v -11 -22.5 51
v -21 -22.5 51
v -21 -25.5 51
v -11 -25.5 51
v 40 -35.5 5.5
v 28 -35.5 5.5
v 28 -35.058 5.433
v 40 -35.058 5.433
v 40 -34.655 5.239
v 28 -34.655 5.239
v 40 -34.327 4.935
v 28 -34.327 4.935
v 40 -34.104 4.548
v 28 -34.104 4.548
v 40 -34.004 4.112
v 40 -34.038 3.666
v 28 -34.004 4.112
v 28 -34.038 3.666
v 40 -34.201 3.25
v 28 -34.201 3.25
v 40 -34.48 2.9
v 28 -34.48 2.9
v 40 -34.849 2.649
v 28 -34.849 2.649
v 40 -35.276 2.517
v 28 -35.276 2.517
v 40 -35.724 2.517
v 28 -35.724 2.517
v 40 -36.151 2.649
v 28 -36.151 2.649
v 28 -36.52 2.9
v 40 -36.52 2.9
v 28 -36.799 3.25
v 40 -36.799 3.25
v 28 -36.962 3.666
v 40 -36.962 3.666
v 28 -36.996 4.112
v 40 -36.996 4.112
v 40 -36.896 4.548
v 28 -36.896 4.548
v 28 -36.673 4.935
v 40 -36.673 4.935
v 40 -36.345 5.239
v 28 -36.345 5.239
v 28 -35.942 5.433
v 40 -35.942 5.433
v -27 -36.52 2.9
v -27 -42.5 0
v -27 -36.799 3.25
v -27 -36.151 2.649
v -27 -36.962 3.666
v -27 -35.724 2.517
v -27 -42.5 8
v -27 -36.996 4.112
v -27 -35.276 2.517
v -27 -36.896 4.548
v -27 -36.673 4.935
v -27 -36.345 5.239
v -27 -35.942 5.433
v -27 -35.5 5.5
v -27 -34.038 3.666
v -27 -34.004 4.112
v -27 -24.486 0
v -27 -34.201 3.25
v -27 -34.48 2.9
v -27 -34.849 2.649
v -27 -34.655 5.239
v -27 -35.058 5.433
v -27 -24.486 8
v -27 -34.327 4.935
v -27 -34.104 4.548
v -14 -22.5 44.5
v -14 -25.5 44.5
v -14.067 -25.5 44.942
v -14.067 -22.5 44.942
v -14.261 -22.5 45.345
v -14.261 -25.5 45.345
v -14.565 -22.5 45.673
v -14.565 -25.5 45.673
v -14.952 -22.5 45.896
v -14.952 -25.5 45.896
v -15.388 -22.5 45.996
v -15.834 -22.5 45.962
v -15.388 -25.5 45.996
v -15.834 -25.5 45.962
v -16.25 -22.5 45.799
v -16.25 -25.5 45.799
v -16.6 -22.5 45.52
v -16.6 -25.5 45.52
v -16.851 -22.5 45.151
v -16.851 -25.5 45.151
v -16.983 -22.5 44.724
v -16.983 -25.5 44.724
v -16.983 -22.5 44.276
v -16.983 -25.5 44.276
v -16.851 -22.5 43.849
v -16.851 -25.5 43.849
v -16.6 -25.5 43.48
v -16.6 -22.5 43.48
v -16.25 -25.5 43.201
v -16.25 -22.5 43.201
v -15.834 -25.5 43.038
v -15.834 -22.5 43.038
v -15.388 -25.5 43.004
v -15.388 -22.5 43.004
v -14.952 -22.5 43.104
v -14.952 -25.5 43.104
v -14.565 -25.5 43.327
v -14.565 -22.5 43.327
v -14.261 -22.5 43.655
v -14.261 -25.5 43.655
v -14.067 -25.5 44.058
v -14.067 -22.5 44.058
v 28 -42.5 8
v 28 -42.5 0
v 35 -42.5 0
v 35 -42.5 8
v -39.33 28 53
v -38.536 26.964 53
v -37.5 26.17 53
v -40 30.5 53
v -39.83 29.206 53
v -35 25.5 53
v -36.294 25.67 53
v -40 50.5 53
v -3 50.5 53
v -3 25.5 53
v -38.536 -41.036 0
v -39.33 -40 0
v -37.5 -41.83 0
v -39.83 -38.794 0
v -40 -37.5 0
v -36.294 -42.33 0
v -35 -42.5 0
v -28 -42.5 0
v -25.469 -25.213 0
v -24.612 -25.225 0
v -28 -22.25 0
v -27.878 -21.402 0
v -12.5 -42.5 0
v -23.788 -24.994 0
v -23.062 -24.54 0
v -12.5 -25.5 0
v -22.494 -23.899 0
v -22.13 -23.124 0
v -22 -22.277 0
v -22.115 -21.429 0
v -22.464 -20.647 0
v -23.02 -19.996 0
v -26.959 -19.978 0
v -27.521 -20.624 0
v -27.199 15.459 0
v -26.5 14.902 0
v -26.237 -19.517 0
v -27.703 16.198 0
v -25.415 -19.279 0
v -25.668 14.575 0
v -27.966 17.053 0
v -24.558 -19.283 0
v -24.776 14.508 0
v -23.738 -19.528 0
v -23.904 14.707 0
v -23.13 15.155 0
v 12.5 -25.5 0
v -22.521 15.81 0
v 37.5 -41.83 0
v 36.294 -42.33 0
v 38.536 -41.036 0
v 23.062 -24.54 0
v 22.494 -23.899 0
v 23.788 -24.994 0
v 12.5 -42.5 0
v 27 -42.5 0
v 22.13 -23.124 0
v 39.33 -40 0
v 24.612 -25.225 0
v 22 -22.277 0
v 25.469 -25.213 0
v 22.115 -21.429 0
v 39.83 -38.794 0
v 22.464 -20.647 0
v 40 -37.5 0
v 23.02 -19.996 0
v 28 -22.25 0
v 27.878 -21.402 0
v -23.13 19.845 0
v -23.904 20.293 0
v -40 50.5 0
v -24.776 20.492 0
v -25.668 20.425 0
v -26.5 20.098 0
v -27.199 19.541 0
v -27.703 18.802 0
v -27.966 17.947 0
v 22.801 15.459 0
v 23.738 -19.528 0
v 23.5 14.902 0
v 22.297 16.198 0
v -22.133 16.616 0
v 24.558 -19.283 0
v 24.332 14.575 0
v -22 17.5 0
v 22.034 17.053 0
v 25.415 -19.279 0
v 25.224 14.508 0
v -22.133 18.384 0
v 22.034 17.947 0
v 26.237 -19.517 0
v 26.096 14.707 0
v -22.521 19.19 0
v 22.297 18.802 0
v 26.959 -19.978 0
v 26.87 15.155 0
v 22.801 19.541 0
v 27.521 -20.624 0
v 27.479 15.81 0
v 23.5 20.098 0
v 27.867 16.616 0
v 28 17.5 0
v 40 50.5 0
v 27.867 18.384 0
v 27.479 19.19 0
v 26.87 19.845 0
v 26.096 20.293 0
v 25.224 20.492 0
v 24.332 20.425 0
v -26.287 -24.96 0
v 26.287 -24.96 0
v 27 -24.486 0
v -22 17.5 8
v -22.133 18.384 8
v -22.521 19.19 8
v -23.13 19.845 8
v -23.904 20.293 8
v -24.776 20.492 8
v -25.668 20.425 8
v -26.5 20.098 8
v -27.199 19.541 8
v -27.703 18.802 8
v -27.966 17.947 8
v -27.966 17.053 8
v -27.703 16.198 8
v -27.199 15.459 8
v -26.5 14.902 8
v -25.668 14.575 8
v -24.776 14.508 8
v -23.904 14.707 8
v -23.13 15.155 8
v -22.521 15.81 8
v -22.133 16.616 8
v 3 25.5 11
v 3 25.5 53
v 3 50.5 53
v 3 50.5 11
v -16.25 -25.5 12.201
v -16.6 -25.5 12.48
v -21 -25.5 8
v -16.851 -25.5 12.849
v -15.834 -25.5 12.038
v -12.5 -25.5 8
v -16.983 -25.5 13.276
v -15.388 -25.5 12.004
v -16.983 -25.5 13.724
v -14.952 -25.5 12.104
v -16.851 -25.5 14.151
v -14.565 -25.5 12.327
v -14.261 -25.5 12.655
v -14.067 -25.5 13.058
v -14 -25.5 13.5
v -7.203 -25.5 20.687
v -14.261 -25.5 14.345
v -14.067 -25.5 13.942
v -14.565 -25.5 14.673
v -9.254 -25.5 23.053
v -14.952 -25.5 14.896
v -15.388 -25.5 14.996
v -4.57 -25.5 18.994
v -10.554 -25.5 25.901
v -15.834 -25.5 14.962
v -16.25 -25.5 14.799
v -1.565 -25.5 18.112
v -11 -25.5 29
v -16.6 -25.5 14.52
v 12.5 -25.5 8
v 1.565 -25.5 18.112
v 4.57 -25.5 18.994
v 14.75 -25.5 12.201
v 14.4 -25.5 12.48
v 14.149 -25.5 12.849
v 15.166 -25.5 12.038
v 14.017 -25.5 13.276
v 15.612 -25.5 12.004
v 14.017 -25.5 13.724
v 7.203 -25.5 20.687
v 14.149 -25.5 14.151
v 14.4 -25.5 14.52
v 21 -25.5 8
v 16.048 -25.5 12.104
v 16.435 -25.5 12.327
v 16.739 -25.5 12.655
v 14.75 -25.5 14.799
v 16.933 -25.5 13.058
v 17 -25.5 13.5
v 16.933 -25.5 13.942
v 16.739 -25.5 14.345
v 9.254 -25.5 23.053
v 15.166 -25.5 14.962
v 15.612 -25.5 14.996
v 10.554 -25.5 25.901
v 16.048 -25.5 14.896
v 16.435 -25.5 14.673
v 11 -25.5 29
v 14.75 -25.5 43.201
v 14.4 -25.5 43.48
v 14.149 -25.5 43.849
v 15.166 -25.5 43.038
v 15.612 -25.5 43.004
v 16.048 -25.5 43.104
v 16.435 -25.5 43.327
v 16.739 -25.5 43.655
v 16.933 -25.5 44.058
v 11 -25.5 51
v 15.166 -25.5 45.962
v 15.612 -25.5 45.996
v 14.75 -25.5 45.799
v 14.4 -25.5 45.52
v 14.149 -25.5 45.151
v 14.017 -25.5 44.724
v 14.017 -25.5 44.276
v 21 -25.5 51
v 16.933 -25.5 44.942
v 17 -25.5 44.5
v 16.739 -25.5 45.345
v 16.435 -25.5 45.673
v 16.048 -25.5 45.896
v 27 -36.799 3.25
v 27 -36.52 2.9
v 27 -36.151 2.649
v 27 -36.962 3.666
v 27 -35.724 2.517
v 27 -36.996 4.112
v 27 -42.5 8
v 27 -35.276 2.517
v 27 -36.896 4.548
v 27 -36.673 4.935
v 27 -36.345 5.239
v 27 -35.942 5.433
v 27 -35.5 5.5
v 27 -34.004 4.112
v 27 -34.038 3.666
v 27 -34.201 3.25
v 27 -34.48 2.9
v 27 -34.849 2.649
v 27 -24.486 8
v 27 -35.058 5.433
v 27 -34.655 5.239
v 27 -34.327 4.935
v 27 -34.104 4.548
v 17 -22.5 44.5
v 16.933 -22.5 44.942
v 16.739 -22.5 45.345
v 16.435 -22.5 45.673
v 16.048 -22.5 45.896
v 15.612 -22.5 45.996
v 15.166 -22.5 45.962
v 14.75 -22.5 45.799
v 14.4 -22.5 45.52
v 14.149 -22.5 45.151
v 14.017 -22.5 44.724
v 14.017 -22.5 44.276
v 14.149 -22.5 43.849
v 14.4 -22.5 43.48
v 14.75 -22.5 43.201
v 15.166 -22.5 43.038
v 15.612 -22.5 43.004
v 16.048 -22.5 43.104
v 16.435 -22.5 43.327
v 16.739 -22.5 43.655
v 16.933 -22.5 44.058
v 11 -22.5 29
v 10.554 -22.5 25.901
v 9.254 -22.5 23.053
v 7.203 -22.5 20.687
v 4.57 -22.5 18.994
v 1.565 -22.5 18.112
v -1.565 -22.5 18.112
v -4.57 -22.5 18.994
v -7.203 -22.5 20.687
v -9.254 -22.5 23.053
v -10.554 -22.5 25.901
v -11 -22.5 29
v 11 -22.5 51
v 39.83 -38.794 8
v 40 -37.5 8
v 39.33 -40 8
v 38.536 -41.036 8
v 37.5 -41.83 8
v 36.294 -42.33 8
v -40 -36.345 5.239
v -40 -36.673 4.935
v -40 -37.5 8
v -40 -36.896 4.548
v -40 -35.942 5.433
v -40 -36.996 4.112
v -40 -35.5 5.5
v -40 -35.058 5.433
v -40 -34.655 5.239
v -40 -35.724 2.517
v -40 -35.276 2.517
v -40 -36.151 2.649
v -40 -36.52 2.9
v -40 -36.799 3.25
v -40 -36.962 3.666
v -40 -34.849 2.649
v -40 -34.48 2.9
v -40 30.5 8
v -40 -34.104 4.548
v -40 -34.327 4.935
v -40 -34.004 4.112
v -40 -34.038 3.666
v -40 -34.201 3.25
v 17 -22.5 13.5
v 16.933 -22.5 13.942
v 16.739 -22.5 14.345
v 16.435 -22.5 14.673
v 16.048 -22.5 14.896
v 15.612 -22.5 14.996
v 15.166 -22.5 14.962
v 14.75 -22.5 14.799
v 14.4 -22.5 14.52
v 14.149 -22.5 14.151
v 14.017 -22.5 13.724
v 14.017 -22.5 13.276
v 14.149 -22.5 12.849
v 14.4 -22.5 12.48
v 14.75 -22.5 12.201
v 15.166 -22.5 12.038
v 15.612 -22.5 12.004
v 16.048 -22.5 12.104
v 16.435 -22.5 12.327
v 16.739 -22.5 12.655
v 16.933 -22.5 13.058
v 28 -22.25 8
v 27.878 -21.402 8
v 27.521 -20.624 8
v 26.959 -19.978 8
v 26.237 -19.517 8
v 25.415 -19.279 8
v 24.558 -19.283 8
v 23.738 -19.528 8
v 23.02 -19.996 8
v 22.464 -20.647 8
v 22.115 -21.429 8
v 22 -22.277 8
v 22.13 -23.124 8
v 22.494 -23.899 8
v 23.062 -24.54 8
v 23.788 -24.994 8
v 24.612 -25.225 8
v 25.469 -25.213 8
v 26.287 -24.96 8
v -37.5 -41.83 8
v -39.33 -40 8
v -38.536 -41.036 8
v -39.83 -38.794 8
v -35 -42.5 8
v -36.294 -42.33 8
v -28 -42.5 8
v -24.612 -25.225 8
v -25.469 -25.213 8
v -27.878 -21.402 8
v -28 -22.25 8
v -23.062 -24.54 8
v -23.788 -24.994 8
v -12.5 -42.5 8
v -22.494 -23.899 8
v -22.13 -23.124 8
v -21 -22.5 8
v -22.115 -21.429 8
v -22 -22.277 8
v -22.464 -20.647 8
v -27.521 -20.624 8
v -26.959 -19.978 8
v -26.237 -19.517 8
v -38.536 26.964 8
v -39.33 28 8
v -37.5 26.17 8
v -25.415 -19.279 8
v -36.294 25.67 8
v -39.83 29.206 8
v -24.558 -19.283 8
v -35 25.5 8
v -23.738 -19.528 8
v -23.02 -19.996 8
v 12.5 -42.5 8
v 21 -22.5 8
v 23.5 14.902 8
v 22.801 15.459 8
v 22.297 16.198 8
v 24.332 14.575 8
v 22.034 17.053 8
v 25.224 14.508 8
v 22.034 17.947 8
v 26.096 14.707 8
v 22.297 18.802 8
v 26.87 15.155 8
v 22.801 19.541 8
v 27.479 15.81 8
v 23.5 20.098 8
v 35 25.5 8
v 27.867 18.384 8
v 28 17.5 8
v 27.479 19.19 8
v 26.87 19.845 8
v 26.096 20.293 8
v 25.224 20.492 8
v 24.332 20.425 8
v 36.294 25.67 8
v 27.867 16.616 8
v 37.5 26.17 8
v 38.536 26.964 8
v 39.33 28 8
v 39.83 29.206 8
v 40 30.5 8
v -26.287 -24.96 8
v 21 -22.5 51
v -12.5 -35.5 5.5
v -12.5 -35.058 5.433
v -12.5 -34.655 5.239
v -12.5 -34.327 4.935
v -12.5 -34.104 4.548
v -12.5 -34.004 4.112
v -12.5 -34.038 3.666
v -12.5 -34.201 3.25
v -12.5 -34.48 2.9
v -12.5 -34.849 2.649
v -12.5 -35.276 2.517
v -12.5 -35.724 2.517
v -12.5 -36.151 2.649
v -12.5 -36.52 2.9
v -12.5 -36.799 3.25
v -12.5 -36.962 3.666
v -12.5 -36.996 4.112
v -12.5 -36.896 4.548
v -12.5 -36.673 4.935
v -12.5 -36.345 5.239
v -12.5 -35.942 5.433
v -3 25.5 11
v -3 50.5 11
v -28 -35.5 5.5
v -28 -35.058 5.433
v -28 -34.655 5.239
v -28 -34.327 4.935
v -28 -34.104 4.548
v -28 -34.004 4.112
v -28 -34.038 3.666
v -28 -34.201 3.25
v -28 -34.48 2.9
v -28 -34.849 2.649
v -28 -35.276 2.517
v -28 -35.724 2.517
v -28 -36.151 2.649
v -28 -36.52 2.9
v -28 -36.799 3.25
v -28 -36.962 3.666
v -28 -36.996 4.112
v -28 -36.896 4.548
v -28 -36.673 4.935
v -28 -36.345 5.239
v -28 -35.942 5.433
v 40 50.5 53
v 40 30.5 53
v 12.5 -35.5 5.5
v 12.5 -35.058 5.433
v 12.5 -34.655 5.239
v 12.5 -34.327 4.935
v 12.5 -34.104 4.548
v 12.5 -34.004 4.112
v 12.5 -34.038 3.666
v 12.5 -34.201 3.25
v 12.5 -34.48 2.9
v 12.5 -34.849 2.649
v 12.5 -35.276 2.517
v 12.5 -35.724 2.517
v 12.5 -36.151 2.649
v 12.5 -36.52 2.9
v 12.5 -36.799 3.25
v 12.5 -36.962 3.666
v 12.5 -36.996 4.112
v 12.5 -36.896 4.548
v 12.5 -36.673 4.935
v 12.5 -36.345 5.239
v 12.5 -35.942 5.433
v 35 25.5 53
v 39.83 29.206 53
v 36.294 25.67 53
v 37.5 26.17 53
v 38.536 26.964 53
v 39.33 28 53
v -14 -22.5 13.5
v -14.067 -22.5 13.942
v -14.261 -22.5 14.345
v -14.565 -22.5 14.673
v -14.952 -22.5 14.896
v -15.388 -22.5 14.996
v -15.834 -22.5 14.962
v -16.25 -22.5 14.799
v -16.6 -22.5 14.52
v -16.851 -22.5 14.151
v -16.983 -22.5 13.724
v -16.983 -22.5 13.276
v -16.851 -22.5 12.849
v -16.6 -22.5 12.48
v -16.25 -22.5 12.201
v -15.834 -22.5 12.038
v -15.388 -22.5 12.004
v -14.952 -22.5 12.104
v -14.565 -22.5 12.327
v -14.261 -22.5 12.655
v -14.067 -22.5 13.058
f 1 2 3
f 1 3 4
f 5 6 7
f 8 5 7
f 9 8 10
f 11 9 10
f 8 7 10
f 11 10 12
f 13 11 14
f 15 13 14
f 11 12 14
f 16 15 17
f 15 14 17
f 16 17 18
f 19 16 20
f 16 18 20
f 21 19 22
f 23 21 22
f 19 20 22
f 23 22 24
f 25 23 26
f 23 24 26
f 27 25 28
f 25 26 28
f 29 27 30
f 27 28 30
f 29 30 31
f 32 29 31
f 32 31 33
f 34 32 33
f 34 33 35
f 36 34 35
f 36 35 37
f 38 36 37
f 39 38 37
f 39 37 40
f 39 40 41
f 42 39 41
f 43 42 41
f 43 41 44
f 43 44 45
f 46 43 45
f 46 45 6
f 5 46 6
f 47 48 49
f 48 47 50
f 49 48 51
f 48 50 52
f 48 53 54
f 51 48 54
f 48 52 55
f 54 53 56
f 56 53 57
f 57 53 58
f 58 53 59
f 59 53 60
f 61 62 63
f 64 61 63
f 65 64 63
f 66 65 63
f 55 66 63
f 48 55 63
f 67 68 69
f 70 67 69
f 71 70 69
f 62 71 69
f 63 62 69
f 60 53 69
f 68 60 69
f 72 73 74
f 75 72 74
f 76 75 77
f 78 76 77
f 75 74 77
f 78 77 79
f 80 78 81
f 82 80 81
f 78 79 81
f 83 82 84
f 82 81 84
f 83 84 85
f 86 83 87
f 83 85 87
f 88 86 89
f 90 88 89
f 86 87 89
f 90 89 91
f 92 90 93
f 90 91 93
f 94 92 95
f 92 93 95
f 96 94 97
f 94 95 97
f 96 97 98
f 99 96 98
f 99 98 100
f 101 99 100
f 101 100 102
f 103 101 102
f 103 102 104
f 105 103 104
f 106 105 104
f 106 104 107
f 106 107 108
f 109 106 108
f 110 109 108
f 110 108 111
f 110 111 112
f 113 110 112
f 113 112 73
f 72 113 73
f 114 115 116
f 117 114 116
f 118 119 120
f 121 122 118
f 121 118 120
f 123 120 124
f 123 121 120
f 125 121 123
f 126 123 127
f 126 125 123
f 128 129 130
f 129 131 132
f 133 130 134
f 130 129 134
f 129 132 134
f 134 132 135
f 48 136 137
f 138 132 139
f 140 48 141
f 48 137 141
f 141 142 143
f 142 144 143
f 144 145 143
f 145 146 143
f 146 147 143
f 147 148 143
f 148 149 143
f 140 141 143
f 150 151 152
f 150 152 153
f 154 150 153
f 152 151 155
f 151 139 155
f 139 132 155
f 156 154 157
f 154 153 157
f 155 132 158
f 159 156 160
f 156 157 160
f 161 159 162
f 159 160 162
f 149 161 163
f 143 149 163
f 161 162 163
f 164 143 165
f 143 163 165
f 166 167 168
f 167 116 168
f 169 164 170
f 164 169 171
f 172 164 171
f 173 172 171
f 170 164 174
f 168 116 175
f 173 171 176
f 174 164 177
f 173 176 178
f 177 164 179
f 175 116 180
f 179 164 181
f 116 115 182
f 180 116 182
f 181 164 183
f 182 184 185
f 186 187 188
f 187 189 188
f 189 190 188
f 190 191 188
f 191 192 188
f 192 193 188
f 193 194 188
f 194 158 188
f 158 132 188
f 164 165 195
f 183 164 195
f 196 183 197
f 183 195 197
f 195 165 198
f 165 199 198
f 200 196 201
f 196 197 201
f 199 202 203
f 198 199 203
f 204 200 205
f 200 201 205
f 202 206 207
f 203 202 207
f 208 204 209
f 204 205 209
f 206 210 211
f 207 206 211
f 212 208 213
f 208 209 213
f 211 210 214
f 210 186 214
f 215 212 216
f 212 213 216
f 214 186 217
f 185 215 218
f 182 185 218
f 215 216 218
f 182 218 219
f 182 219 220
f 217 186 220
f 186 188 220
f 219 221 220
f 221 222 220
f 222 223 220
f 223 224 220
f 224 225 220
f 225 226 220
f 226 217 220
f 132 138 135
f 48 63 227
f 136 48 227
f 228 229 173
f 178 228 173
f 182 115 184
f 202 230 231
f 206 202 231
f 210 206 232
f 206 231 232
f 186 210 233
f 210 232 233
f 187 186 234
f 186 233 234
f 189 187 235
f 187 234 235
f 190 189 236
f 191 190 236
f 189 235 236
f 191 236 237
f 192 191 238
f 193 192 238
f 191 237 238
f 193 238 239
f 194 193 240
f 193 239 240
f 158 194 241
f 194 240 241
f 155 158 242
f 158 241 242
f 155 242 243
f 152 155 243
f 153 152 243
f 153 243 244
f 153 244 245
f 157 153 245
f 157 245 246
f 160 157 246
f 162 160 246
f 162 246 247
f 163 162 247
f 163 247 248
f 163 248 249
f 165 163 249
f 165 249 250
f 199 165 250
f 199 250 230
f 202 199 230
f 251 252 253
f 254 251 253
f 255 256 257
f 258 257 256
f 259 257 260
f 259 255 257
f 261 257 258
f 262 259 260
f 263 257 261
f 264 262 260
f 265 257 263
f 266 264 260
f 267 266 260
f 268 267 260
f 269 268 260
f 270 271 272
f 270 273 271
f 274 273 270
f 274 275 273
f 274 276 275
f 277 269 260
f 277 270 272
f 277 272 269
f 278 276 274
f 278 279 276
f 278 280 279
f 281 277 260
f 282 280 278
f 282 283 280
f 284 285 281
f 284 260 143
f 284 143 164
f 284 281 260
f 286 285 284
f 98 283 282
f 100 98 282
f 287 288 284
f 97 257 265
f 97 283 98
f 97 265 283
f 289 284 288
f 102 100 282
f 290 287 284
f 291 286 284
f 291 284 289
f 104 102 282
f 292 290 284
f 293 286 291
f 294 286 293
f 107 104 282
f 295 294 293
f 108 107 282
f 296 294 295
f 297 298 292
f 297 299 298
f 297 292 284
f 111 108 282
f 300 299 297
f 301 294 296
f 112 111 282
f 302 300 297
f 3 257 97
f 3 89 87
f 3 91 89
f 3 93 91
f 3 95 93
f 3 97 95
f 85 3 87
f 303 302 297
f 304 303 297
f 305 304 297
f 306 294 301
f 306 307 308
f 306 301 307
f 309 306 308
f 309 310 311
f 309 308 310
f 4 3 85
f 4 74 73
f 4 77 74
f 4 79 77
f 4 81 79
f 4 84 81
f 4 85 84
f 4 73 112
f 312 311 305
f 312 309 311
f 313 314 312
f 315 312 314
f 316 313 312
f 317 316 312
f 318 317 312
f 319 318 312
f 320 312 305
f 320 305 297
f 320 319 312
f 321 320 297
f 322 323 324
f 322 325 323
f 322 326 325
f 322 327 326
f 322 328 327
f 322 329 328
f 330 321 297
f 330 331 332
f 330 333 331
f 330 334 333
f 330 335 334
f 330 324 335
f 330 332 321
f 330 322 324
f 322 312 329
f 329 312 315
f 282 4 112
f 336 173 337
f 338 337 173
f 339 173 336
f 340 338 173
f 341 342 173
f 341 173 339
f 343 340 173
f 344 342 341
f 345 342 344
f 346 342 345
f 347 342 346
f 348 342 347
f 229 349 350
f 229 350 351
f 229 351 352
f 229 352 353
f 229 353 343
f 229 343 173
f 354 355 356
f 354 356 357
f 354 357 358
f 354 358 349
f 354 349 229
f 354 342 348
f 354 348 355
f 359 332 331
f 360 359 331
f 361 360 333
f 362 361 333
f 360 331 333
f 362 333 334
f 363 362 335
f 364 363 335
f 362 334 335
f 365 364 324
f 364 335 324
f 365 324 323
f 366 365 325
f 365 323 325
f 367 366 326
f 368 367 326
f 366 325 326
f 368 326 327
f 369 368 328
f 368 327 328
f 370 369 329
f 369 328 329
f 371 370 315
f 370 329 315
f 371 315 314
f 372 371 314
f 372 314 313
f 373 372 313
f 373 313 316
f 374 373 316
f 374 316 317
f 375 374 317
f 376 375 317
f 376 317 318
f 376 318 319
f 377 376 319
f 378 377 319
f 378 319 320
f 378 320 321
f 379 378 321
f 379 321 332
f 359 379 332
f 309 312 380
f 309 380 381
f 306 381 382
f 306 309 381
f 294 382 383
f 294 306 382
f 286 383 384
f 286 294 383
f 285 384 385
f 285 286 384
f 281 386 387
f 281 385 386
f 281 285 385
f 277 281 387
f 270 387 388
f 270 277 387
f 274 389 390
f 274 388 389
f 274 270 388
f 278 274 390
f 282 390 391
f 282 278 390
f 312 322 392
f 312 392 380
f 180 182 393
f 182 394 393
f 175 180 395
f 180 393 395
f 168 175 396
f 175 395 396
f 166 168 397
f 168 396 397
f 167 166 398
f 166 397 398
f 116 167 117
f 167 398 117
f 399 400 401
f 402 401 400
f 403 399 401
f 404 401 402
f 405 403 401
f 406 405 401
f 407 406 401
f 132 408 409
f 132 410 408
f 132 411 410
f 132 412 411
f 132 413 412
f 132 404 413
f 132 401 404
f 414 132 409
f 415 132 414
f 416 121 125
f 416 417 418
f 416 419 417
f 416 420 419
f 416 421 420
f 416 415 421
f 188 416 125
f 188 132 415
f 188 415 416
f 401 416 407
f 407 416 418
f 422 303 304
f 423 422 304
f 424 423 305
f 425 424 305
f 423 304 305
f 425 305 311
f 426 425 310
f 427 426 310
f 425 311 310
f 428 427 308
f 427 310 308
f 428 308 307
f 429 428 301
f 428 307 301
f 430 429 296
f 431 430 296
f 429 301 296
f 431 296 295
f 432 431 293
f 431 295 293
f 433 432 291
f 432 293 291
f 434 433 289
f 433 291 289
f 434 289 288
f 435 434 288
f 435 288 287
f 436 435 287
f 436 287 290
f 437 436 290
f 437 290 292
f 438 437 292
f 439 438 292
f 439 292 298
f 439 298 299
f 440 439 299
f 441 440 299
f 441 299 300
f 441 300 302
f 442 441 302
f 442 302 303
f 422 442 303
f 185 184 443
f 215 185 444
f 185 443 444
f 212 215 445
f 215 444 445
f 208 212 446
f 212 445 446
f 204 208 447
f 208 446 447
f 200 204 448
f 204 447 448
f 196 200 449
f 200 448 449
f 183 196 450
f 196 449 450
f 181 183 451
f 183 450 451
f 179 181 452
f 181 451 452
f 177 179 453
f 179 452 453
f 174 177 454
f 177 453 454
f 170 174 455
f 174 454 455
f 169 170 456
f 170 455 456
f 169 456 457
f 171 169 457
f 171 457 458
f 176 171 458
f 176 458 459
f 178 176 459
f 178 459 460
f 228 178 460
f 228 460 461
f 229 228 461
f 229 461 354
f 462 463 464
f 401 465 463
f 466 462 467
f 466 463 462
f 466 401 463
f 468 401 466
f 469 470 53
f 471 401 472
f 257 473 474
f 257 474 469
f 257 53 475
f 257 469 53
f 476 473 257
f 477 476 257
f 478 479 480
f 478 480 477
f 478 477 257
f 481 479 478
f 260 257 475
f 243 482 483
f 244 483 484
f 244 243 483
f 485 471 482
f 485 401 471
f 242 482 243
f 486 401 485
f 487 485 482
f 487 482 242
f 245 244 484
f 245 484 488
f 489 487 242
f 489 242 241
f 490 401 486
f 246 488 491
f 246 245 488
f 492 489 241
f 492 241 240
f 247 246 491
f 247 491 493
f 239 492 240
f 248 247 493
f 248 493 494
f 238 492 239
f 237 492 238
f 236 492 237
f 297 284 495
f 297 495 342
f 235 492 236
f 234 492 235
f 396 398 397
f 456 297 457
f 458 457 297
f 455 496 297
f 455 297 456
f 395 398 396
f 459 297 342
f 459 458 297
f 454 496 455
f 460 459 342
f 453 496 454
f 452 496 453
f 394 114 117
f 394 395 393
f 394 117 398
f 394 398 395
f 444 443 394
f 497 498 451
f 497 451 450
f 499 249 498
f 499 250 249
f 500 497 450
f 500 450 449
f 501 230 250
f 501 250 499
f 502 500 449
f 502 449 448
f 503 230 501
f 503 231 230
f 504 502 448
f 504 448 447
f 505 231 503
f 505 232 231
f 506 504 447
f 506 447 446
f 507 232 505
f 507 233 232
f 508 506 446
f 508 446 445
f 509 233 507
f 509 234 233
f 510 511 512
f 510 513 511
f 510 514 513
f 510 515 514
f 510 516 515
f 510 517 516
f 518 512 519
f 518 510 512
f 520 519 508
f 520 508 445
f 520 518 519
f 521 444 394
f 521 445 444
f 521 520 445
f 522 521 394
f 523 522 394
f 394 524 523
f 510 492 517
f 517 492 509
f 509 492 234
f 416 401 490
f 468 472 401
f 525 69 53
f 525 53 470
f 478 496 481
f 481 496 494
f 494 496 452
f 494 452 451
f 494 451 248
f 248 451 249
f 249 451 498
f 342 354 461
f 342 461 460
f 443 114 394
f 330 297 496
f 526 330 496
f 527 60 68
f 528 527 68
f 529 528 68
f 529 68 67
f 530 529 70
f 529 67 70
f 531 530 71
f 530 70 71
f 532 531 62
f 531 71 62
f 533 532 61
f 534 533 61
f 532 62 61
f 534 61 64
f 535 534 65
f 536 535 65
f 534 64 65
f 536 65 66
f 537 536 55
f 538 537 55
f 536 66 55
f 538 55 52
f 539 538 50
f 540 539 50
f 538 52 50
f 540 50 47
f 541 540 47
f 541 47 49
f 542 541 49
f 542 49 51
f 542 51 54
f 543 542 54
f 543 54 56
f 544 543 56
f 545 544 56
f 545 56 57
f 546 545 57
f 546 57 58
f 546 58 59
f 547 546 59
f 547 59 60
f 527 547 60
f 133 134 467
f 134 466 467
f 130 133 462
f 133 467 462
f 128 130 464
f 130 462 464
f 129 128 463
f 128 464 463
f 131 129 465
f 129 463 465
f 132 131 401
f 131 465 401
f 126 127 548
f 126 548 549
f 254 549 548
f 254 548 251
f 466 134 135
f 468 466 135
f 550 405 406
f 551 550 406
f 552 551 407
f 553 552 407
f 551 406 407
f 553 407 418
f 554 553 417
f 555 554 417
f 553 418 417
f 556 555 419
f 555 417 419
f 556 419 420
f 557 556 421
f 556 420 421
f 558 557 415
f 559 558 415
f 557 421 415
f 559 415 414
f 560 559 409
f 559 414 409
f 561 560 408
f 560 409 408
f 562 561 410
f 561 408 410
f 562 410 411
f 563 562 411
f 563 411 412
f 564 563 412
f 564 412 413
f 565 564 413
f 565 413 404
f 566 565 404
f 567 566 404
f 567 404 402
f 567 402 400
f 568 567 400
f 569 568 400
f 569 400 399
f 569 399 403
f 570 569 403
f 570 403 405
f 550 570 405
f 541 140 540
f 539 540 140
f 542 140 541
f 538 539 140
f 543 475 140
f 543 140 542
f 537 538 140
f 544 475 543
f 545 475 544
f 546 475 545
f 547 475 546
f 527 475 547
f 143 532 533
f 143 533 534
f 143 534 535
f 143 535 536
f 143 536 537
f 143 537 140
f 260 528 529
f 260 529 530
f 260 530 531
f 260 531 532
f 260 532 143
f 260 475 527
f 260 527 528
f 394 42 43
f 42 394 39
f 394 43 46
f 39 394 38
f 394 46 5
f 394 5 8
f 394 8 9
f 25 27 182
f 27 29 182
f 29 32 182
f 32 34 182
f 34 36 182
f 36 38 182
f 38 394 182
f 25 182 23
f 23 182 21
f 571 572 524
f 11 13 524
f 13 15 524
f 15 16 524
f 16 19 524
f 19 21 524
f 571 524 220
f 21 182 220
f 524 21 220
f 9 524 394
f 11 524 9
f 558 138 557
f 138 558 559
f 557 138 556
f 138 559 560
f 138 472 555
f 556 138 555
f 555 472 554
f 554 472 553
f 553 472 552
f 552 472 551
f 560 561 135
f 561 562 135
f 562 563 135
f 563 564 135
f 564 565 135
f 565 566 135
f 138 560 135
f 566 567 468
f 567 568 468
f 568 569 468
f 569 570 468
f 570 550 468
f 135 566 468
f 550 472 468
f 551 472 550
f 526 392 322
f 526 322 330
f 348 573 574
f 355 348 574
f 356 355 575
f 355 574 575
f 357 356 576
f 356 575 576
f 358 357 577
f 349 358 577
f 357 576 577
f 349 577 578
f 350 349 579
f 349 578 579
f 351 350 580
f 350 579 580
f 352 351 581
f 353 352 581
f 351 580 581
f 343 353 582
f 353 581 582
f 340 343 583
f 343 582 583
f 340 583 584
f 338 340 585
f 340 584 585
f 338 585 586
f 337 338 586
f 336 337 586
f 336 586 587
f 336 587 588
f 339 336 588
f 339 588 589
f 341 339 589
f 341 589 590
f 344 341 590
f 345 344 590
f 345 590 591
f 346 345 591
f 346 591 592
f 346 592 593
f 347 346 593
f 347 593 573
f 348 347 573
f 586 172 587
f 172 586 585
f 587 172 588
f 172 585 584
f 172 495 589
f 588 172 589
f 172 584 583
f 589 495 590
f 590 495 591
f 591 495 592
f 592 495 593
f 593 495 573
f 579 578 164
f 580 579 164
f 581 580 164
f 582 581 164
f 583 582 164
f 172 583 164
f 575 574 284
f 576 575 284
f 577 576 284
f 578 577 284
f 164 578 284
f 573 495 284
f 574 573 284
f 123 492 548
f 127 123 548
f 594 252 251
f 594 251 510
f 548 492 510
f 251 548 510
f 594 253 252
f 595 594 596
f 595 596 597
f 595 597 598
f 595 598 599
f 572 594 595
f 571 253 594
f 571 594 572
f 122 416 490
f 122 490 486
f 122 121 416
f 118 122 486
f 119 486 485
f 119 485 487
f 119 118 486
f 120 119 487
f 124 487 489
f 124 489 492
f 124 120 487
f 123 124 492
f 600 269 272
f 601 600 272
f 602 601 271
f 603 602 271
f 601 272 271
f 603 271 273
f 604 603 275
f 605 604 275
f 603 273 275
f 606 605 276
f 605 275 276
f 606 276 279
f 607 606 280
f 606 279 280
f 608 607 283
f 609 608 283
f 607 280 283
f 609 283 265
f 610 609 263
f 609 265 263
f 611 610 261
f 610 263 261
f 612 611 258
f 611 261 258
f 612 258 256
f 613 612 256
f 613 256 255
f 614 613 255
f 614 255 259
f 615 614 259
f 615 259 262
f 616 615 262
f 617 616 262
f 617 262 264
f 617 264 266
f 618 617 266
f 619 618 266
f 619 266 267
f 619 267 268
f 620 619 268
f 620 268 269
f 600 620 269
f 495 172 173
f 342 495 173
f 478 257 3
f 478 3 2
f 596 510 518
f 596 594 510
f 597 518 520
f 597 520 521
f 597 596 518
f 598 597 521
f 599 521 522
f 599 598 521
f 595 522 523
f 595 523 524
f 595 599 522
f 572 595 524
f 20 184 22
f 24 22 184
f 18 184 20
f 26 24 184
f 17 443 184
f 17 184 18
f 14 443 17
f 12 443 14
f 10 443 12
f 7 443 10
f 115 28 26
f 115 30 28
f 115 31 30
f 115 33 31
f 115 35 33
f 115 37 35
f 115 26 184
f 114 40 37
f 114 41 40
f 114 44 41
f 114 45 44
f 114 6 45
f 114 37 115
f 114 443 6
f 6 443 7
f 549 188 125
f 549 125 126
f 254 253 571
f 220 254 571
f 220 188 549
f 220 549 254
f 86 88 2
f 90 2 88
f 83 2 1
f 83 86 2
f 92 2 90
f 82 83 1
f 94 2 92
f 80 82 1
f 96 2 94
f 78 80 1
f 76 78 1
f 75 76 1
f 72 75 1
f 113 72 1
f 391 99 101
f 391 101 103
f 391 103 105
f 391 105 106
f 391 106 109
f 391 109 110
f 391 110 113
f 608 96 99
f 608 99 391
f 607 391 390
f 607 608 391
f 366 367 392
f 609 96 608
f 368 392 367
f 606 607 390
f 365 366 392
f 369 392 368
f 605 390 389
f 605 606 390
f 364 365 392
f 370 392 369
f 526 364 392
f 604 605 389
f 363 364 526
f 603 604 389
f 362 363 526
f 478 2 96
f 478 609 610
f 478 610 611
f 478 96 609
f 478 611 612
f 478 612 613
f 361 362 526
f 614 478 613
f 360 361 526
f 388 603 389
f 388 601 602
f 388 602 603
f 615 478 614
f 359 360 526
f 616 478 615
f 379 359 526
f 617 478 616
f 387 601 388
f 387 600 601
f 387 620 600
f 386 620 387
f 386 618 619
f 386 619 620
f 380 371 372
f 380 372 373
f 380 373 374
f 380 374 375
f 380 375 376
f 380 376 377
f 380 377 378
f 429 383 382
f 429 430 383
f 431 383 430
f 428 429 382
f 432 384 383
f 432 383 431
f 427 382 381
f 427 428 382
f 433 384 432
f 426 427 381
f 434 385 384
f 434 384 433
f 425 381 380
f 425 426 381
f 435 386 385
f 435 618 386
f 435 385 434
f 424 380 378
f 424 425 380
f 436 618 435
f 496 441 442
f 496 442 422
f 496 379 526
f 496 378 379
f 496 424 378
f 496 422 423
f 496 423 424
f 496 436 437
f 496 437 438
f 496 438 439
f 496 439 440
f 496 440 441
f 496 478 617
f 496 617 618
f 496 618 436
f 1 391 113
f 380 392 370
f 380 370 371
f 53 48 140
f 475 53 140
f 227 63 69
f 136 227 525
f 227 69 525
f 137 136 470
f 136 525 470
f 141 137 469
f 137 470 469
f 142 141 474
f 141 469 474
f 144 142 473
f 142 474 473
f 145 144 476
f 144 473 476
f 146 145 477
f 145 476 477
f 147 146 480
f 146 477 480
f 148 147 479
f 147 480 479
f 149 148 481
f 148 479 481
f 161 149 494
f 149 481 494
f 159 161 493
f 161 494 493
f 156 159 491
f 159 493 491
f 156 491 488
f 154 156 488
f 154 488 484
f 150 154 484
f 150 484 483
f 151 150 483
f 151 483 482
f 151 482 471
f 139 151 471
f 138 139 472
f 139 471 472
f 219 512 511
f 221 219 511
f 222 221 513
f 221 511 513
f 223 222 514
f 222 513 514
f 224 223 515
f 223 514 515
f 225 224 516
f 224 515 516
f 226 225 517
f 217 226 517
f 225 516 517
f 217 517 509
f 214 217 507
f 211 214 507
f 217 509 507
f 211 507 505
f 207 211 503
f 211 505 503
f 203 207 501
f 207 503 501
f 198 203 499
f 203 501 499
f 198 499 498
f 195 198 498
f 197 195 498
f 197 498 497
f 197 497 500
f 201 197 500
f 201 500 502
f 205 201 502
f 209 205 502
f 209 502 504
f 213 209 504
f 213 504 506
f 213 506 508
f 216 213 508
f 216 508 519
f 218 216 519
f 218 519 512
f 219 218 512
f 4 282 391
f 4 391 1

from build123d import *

# Parameters (mm, degrees)
EXTRUDE_1_DEPTH          = 8
SKETCH_3_W               = 42
SKETCH_3_H               = 3
EXTRUDE_2_DEPTH          = 43
CUT_EXTRUDE_1_REACH      = 78
SKETCH_4_R               = 1.5
SKETCH_5_W               = 25
SKETCH_5_H               = 17
CUT_EXTRUDE_2_DEPTH      = 9
SKETCH_7_R               = 3
CUT_EXTRUDE_3_DEPTH      = 9
FILLET_1_R               = 5
CUT_EXTRUDE_4_DEPTH      = 9
SKETCH_9_R               = 1.5
CUT_EXTRUDE_5_DEPTH      = 1
CUT_EXTRUDE_5_DEPTH_BACK = 81
SKETCH_12_W              = 80
SKETCH_12_H              = 25
EXTRUDE_4_DEPTH          = 45
SKETCH_13_W              = 6
SKETCH_13_H              = 25
CUT_EXTRUDE_6_DEPTH      = 42
FILLET_3_R               = 5
FILLET_4_R               = 5


with BuildPart() as part:
    # 草图1 → 凸台-拉伸1 (new body)
    with BuildSketch(Plane.XY):
        Polygon((-40, -42.5), (40, -42.5), (40, 42.5), (40, 50.5), (-40, 50.5), (-40, 42.5), align=None)
    extrude(amount=EXTRUDE_1_DEPTH)

    # 草图3 → 凸台-拉伸2 (add)
    with BuildSketch(Plane.XY.offset(8)):
        with Locations((0, -24)):
            Rectangle(SKETCH_3_W, SKETCH_3_H)
    extrude(amount=EXTRUDE_2_DEPTH)

    # 草图4 → 切除-拉伸1 (cut, up to next)
    with BuildSketch(Plane.XZ.offset(25.5), mode=Mode.PRIVATE) as cut_extrude_1_sk1:
        with Locations((-15.5, 44.5)):
            Circle(SKETCH_4_R)
    cut_extrude_1_tool1 = extrude(cut_extrude_1_sk1.sketch, amount=-CUT_EXTRUDE_1_REACH, mode=Mode.PRIVATE) & part.part
    add(cut_extrude_1_tool1.solids().sort_by_distance((-15.5, -25.5, 44.5))[0], mode=Mode.SUBTRACT)
    # 草图4 → 切除-拉伸1 (cut, up to next)
    with BuildSketch(Plane.XZ.offset(25.5), mode=Mode.PRIVATE) as cut_extrude_1_sk2:
        with Locations((15.5, 44.5)):
            Circle(SKETCH_4_R)
    cut_extrude_1_tool2 = extrude(cut_extrude_1_sk2.sketch, amount=-CUT_EXTRUDE_1_REACH, mode=Mode.PRIVATE) & part.part
    add(cut_extrude_1_tool2.solids().sort_by_distance((15.5, -25.5, 44.5))[0], mode=Mode.SUBTRACT)
    # 草图4 → 切除-拉伸1 (cut, up to next)
    with BuildSketch(Plane.XZ.offset(25.5), mode=Mode.PRIVATE) as cut_extrude_1_sk3:
        with Locations((15.5, 13.5)):
            Circle(SKETCH_4_R)
    cut_extrude_1_tool3 = extrude(cut_extrude_1_sk3.sketch, amount=-CUT_EXTRUDE_1_REACH, mode=Mode.PRIVATE) & part.part
    add(cut_extrude_1_tool3.solids().sort_by_distance((15.5, -25.5, 13.5))[0], mode=Mode.SUBTRACT)
    # 草图4 → 切除-拉伸1 (cut, up to next)
    with BuildSketch(Plane.XZ.offset(25.5), mode=Mode.PRIVATE) as cut_extrude_1_sk4:
        with Locations((-15.5, 13.5)):
            Circle(SKETCH_4_R)
    cut_extrude_1_tool4 = extrude(cut_extrude_1_sk4.sketch, amount=-CUT_EXTRUDE_1_REACH, mode=Mode.PRIVATE) & part.part
    add(cut_extrude_1_tool4.solids().sort_by_distance((-15.5, -25.5, 13.5))[0], mode=Mode.SUBTRACT)
    # 草图4 → 切除-拉伸1 (cut, up to next)
    with BuildSketch(Plane.XZ.offset(25.5), mode=Mode.PRIVATE) as cut_extrude_1_sk5:
        with BuildLine():
            Line((-11, 29), (-11, 51))
            Line((-11, 51), (11, 51))
            Line((11, 51), (11, 29))
            ThreePointArc((11, 29), (0, 18), (-11, 29))
        make_face()
    cut_extrude_1_tool5 = extrude(cut_extrude_1_sk5.sketch, amount=-CUT_EXTRUDE_1_REACH, mode=Mode.PRIVATE) & part.part
    add(cut_extrude_1_tool5.solids().sort_by_distance((0, -25.5, 35.581943))[0], mode=Mode.SUBTRACT)

    # 草图5 → 切除-拉伸2 (cut, through all)
    with BuildSketch(Plane.XY.offset(8)):
        with Locations((0, -34)):
            Rectangle(SKETCH_5_W, SKETCH_5_H)
    extrude(amount=-CUT_EXTRUDE_2_DEPTH, mode=Mode.SUBTRACT)

    # 草图7 → 切除-拉伸3 (cut, through all)
    with BuildSketch(Plane.XY.offset(8)):
        with Locations((-25, 17.5)):
            Circle(SKETCH_7_R)
        with Locations((25, 17.5)):
            Circle(SKETCH_7_R)
        with Locations((-25, -22.25)):
            Circle(SKETCH_7_R)
        with Locations((25, -22.25)):
            Circle(SKETCH_7_R)
    extrude(amount=-CUT_EXTRUDE_3_DEPTH, mode=Mode.SUBTRACT)

    # 圆角1
    fillet_1_edges = [part.edges().sort_by_distance(p)[0] for p in [
        (-40, -42.5, 4),
    ]]
    fillet(fillet_1_edges, radius=FILLET_1_R)

    # 草图8 → 切除-拉伸4 (cut, through all)
    with BuildSketch(Plane.XY.offset(8)):
        with BuildLine():
            Line((-28, -22.25), (-28, -42.5))
            Line((-28, -42.5), (-27, -42.5))
            Line((-27, -42.5), (-27, -24.486067977))
            ThreePointArc((-27, -24.486067977), (-27.738612788, -23.474744871), (-28, -22.25))
        make_face()
        with BuildLine():
            Line((28, -42.5), (27, -42.5))
            Line((27, -42.5), (27, -24.486067977))
            ThreePointArc((27, -24.486067977), (27.738612788, -23.474744871), (28, -22.25))
            Line((28, -22.25), (28, -42.5))
        make_face()
    extrude(amount=-CUT_EXTRUDE_4_DEPTH, mode=Mode.SUBTRACT)

    # 草图9 → 切除-拉伸5 (cut, two sides)
    with BuildSketch(Plane.ZY.offset(40)) as cut_extrude_5_sk:
        with Locations((4, -35.5)):
            Circle(SKETCH_9_R)
    extrude(amount=CUT_EXTRUDE_5_DEPTH, mode=Mode.SUBTRACT)
    extrude(cut_extrude_5_sk.sketch, amount=-CUT_EXTRUDE_5_DEPTH_BACK, mode=Mode.SUBTRACT)

    # 草图12 → 凸台-拉伸4 (add)
    with BuildSketch(Plane.XY.offset(8)):
        with Locations((0, 38)):
            Rectangle(SKETCH_12_W, SKETCH_12_H)
    extrude(amount=EXTRUDE_4_DEPTH)

    # 草图13 → 切除-拉伸6 (cut)
    with BuildSketch(Plane.XY.offset(53)):
        with Locations((0, 38)):
            Rectangle(SKETCH_13_W, SKETCH_13_H)
    extrude(amount=-CUT_EXTRUDE_6_DEPTH, mode=Mode.SUBTRACT)

    # 圆角3
    fillet_3_edges = [part.edges().sort_by_distance(p)[0] for p in [
        (-40, 25.5, 30.5),
        (40, 25.5, 30.5),
    ]]
    fillet(fillet_3_edges, radius=FILLET_3_R)

    # 圆角4
    fillet_4_edges = [part.edges().sort_by_distance(p)[0] for p in [
        (40, -42.5, 4),
    ]]
    fillet(fillet_4_edges, radius=FILLET_4_R)


solid = part.part
